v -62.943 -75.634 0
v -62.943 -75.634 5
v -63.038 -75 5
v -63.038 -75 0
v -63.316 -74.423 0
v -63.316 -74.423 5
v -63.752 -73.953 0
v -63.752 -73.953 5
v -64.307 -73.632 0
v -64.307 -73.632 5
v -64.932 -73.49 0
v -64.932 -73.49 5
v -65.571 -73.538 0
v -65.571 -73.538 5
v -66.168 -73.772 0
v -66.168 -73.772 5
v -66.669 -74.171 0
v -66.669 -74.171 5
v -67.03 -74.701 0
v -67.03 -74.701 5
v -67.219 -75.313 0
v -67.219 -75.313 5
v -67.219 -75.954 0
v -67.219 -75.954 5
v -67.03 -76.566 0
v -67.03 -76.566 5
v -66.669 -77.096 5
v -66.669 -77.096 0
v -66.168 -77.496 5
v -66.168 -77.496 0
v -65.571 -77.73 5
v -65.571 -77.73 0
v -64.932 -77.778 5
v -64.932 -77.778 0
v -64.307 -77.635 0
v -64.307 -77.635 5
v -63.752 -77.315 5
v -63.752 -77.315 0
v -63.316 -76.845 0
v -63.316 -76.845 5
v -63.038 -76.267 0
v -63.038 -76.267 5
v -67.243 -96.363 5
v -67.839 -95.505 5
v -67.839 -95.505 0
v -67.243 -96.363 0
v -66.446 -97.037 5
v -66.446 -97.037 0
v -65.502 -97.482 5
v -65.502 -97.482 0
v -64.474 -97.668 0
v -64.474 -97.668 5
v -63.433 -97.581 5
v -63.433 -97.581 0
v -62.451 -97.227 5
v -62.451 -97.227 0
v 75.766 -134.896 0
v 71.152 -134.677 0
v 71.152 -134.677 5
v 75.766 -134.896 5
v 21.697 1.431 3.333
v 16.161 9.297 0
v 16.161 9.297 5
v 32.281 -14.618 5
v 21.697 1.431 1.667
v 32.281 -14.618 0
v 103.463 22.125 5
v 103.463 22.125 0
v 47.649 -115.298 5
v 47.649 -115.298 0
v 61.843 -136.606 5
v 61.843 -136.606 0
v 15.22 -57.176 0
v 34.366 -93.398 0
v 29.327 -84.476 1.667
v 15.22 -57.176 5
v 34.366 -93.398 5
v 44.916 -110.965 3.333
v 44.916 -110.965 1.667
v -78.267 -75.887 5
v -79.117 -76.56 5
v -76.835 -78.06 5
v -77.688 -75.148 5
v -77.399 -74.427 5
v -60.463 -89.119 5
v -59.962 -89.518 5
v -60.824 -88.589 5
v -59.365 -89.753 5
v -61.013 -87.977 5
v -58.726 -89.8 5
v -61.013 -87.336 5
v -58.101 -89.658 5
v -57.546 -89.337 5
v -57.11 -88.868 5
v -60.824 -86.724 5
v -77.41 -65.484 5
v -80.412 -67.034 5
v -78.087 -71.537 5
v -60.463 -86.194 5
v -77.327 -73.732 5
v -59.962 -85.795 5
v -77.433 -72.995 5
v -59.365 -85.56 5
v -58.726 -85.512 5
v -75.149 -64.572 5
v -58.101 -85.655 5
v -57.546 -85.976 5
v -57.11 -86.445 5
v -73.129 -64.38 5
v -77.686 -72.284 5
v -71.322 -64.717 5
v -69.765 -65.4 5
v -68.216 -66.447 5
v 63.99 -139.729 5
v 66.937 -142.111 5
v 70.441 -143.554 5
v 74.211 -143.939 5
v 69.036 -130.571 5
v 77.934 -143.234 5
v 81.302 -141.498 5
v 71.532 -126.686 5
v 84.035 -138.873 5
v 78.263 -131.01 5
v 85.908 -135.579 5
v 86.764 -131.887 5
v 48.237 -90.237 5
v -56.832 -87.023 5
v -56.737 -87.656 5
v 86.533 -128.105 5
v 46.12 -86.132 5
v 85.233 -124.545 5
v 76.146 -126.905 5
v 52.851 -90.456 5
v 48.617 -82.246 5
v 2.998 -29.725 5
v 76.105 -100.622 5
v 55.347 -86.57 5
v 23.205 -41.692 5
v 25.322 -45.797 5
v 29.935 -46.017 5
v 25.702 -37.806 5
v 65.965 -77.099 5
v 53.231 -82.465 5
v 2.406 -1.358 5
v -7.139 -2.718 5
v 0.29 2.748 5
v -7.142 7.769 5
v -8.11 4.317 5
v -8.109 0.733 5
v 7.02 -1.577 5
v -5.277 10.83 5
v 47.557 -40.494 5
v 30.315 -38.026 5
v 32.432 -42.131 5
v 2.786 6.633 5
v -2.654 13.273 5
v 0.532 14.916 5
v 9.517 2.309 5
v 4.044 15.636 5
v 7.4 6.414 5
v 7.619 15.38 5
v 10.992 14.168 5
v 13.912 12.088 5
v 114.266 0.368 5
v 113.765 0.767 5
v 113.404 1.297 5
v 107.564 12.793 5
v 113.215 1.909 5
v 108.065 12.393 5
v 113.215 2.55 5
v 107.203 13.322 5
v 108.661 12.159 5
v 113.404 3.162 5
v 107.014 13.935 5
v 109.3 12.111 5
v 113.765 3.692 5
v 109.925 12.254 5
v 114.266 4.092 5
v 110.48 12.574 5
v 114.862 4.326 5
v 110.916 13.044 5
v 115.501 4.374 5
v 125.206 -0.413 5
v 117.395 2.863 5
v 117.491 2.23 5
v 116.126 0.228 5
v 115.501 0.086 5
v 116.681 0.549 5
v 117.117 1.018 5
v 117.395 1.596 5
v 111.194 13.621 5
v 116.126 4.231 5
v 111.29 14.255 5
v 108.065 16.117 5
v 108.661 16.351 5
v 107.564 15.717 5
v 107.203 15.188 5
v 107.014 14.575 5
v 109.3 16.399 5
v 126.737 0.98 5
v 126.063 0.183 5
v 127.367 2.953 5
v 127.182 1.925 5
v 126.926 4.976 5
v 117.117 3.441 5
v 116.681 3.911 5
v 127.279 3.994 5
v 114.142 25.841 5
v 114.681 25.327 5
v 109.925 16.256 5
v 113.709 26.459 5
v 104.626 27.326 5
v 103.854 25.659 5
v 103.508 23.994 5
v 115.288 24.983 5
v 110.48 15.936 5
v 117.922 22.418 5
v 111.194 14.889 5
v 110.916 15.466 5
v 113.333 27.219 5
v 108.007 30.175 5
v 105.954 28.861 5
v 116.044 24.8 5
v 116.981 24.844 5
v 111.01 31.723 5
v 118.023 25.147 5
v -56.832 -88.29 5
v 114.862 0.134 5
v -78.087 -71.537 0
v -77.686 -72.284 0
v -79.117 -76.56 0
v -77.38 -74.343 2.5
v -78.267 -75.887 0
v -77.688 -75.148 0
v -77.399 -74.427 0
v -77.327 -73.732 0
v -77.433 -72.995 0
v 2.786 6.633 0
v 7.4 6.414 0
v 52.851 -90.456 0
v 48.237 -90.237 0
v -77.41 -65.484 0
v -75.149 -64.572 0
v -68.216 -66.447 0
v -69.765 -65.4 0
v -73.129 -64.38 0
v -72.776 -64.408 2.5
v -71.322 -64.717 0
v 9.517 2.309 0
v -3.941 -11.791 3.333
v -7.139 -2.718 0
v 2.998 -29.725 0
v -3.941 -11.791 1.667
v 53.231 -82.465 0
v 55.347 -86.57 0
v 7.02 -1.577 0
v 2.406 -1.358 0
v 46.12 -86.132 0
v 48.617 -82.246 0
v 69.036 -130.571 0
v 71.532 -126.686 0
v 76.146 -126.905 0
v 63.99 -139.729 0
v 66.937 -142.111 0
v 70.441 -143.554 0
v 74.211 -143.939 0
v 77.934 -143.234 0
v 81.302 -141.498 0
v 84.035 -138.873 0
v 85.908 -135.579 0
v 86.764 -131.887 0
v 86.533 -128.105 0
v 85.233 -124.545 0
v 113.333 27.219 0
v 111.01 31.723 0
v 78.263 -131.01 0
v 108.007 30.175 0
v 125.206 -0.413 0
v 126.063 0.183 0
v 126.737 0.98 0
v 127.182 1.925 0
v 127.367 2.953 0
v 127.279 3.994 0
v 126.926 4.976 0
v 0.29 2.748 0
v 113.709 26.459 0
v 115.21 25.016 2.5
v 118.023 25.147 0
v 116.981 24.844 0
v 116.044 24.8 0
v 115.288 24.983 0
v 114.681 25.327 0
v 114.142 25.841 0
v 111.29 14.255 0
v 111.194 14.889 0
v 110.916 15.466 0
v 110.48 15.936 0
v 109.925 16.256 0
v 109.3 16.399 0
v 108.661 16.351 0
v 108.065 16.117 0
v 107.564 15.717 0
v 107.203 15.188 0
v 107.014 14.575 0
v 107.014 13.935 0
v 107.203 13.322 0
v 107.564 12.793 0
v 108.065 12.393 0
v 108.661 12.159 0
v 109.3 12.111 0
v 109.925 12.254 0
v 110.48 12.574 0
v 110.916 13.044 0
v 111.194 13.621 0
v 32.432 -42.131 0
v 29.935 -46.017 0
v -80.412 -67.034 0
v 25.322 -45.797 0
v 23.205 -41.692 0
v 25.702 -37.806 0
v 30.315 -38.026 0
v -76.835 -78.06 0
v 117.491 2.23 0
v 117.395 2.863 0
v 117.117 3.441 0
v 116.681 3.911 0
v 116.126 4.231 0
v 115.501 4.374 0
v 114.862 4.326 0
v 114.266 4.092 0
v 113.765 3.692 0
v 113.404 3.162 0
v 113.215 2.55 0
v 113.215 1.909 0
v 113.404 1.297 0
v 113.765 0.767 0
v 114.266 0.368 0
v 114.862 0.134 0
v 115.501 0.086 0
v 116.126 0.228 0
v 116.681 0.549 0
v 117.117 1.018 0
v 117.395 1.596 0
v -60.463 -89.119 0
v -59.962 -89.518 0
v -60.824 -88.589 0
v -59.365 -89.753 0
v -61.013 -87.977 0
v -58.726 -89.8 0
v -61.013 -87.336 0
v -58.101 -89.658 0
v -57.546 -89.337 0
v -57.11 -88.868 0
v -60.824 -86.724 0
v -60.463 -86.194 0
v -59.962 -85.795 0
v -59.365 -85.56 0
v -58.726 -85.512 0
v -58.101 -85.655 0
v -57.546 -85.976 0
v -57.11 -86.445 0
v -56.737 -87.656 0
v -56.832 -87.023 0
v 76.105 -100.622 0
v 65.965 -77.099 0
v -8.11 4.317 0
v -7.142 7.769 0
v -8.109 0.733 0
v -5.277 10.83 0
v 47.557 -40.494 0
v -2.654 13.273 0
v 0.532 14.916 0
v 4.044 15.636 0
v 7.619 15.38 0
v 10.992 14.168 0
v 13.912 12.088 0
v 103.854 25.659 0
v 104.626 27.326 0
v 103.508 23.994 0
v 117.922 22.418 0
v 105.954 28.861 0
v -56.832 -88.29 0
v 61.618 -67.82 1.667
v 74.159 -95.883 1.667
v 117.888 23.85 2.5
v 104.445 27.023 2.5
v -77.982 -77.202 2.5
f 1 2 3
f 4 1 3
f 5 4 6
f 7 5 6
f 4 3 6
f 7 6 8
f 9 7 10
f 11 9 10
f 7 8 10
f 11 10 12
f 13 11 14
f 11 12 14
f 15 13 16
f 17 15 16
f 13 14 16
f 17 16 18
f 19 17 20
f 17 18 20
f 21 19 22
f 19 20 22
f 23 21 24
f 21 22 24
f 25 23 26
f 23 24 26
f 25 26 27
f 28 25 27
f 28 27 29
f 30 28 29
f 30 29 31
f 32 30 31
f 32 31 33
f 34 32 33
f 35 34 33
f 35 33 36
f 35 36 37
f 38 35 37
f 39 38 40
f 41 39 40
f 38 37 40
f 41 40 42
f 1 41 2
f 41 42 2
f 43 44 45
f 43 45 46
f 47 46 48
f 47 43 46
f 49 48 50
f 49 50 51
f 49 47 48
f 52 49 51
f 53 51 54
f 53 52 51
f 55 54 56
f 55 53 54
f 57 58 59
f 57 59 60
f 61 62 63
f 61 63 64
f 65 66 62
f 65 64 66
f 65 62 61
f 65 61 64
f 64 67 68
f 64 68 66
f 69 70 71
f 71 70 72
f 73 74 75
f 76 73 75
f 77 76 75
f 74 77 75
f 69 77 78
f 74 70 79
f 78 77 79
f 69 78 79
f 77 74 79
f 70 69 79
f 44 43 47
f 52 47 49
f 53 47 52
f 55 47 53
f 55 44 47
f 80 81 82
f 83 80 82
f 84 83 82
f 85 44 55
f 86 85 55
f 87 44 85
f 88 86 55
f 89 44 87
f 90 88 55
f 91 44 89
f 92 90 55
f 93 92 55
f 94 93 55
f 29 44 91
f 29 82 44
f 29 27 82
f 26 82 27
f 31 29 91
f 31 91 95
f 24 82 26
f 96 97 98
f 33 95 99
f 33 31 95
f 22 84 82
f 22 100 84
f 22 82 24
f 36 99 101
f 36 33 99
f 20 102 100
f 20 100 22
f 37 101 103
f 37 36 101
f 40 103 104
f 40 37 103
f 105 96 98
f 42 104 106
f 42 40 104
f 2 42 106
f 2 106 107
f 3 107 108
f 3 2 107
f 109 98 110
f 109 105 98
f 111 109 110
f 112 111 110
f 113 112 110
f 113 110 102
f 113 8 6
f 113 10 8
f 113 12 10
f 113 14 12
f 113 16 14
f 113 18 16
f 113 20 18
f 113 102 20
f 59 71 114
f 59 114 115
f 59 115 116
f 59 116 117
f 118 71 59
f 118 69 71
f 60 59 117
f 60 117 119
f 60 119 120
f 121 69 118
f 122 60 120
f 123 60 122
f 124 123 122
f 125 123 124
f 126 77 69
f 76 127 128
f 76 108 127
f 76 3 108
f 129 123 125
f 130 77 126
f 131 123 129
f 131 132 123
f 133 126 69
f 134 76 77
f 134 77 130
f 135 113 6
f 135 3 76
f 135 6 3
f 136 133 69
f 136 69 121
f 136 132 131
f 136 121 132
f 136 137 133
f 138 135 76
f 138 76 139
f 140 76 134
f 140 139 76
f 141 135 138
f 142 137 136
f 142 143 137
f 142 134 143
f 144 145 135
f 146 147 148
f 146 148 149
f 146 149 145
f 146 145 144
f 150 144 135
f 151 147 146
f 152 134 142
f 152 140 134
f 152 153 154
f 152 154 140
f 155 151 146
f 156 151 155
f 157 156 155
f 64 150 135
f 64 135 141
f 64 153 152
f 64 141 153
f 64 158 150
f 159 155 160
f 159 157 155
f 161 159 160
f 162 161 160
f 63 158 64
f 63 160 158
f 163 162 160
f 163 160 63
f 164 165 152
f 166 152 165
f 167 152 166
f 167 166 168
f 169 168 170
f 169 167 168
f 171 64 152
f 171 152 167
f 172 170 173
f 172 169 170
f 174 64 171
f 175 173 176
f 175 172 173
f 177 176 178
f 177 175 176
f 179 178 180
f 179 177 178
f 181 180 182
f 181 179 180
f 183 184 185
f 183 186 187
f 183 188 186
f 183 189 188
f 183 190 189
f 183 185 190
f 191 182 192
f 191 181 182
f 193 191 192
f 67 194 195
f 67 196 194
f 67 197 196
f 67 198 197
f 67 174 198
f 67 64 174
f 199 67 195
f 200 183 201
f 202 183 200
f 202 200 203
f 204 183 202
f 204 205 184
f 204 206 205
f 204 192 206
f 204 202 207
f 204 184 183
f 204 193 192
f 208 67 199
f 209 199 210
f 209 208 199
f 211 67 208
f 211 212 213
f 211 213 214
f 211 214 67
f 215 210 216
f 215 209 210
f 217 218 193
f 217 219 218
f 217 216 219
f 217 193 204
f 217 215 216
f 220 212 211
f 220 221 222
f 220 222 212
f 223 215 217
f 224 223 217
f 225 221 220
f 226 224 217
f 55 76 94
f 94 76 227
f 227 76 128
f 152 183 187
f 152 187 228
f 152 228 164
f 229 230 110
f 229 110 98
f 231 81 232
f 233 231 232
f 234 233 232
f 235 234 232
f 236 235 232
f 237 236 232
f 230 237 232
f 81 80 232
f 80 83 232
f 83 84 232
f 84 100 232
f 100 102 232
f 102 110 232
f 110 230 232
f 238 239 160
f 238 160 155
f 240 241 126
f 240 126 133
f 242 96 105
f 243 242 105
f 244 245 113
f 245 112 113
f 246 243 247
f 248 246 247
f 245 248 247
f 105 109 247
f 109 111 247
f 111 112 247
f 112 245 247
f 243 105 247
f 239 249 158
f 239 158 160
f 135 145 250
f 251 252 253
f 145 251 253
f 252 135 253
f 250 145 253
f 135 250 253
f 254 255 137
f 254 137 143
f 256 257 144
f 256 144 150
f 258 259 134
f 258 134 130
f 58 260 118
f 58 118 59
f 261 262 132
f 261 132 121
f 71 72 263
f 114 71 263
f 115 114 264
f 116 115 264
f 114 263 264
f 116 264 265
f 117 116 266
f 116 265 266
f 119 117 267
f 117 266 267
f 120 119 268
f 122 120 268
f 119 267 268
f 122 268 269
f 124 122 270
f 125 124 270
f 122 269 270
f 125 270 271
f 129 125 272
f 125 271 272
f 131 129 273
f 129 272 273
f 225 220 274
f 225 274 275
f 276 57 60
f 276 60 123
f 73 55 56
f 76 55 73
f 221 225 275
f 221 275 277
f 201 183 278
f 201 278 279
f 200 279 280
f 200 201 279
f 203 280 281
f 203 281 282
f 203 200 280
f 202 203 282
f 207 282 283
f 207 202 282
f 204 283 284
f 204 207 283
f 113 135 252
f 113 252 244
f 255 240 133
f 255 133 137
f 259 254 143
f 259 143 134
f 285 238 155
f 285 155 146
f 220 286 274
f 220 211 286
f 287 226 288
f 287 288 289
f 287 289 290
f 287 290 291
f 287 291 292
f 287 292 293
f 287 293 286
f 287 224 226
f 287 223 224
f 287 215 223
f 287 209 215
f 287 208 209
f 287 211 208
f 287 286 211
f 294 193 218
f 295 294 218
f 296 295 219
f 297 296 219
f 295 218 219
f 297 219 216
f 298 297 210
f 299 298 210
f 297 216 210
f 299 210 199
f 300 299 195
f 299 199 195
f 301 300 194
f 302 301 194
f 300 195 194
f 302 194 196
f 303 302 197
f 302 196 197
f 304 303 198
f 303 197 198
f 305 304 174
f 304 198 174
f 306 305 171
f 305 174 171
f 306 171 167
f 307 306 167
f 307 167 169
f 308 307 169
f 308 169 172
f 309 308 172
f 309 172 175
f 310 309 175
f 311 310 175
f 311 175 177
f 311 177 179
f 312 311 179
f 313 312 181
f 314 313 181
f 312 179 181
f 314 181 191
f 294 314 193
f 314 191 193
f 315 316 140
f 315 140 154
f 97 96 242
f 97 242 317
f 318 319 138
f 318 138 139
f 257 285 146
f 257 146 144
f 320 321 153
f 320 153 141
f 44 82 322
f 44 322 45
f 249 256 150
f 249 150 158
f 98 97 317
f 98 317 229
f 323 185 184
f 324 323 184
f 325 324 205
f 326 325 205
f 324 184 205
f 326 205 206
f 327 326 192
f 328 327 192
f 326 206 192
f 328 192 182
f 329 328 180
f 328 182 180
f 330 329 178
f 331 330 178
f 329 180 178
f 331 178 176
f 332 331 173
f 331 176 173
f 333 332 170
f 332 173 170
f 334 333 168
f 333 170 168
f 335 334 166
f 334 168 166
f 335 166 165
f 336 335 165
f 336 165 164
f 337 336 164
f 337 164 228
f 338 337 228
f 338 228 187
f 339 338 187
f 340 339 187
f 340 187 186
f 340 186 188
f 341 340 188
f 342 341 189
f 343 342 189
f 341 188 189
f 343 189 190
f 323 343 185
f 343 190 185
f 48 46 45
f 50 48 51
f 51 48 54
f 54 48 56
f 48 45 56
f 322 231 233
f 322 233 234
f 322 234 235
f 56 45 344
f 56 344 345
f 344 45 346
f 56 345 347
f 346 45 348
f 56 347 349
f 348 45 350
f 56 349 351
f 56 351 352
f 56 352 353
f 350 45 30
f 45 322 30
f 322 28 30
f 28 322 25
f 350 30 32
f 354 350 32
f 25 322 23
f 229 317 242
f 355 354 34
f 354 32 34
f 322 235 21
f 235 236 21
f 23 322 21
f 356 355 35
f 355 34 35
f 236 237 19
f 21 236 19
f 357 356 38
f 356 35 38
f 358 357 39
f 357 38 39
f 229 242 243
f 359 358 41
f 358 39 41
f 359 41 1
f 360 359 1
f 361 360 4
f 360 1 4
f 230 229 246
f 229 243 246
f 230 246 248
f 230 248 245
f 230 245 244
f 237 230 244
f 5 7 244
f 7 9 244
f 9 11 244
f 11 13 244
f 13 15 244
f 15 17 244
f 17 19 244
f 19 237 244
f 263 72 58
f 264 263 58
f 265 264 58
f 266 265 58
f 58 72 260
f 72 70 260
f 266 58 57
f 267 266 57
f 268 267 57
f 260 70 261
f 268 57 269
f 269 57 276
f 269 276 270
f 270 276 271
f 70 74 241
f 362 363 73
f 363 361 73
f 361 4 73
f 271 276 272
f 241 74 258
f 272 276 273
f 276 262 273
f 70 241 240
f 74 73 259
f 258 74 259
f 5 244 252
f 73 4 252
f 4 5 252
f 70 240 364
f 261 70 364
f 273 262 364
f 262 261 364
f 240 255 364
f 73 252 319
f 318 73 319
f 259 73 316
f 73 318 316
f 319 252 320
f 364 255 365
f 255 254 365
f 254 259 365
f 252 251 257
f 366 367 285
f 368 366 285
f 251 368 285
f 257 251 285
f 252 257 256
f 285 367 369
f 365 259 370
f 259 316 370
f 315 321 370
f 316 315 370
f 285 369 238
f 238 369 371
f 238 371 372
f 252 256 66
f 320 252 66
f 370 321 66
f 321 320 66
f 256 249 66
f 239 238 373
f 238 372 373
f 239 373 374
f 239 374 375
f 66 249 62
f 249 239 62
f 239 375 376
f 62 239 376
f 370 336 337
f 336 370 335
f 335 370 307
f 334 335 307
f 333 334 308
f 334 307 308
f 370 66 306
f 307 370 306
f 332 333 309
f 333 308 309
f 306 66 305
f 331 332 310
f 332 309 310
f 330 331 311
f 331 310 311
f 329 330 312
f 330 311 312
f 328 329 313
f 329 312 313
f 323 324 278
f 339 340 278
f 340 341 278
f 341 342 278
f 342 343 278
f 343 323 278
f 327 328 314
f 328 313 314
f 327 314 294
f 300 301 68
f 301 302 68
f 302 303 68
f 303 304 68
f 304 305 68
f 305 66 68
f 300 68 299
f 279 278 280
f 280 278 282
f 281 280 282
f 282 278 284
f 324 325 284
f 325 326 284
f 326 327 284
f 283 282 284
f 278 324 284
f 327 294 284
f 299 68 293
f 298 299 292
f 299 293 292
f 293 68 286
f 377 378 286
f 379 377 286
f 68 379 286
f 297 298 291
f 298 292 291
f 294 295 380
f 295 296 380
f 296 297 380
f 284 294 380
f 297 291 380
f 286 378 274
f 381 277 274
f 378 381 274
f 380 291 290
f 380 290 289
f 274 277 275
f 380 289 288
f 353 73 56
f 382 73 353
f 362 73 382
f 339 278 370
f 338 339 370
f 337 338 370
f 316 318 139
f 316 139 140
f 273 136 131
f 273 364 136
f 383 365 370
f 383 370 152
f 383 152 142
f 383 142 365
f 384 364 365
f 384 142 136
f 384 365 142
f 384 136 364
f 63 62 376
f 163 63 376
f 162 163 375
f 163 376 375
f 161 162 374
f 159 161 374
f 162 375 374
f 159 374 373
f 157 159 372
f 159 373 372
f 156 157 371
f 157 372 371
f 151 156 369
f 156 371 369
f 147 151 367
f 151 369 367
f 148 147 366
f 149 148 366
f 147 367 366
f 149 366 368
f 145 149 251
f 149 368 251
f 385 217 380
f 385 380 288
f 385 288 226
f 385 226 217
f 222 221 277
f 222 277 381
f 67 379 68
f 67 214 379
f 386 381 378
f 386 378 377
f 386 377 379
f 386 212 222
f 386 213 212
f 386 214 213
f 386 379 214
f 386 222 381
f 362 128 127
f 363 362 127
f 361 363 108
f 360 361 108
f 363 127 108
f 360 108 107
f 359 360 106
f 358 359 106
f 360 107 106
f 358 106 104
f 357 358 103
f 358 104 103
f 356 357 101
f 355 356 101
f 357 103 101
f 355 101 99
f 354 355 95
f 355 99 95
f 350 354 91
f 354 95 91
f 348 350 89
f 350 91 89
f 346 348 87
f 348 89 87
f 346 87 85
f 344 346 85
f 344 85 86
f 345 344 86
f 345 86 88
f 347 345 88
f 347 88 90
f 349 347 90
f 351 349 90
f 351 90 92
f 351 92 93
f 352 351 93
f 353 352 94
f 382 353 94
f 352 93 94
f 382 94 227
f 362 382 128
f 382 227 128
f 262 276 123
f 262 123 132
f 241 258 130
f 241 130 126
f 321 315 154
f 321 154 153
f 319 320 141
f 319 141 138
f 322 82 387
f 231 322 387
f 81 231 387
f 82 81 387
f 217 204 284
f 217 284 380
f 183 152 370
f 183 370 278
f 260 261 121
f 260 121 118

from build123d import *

# Parameters (mm, degrees)
BOSS_EXTRUDE1_DEPTH = 5
SKETCH4_R           = 2.15
BOSS_EXTRUDE2_DEPTH = 5


with BuildPart() as part:
    # Sketch3 → Boss-Extrude1 (new body)
    with BuildSketch(Plane.XY):
        with BuildLine():
            ThreePointArc((16.161070517, 9.296643019), (-1.117119854, 14.203399989), (-7.139484482, -2.718279914))
            add(Edge.make_bspline(
                [(-7.139484482, -2.718279914), (9.132754629, -50.436524862), (33.087399733, -95.298268059), (61.843065412, -136.60626672)],
                knots=[0, 0, 0, 0, 1, 1, 1, 1], degree=3))
            ThreePointArc((61.843065412, -136.60626672), (79.680701211, -142.48791497), (85.233269402, -124.545116316))
            add(Edge.make_bspline(
                [(16.161070517, 9.296643019), (45.599741143, -31.632336181), (68.256168937, -77.163504674), (85.233269402, -124.545116316)],
                knots=[0, 0, 0, 0, 1, 1, 1, 1], degree=3))
        make_face()
        Polygon((78.262696046, -131.010190899), (76.145869285, -126.905026127), (71.532278927, -126.685669492), (69.035515328, -130.571477627), (71.152342089, -134.676642399), (75.765932447, -134.895999034), align=None, mode=Mode.SUBTRACT)
        Polygon((55.347374171, -86.570478665), (53.230547411, -82.465313894), (48.616957052, -82.245957258), (46.120193454, -86.131765394), (48.237020214, -90.236930165), (52.850610573, -90.456286801), align=None, mode=Mode.SUBTRACT)
        Polygon((32.432052297, -42.130766432), (30.315225536, -38.025601661), (25.701635178, -37.806245025), (23.204871579, -41.69205316), (25.32169834, -45.797217932), (29.935288698, -46.016574567), align=None, mode=Mode.SUBTRACT)
        Polygon((9.516730422, 2.308945802), (7.399903662, 6.414110573), (2.786313303, 6.633467209), (0.289549705, 2.747659073), (2.406376465, -1.357505698), (7.019966824, -1.576862334), align=None, mode=Mode.SUBTRACT)
    extrude(amount=BOSS_EXTRUDE1_DEPTH)

    # Sketch4 → Boss-Extrude2 (add)
    # profile 1 of 2: a face of its own
    with BuildSketch(Plane.XY.offset(5)):
        with BuildLine():
            Line((-62.450693281, -97.22736689), (15.220358234, -57.176316709))
            add(Edge.make_bspline(
                [(2.997808313, -29.725276343), (6.797307694, -38.99575652), (10.8790517, -48.14793286), (15.220358234, -57.176316709)],
                knots=[0.19087071, 0.19087071, 0.19087071, 0.19087071, 0.389797815, 0.389797815, 0.389797815, 0.389797815], degree=3))
            Line((2.997808313, -29.725276343), (-68.216036929, -66.446670398))
            add(Edge.make_bspline(
                [(-77.409704675, -65.483914752), (-72.739634543, -62.850222111), (-68.216036929, -66.446670398)],
                knots=[0, 0, 0, 1, 1, 1], degree=2))
            Line((-77.409704675, -65.483914752), (-80.411912193, -67.033578992))
            Line((-80.411912193, -67.033578992), (-78.087434927, -71.536853276))
            add(Edge.make_bspline(
                [(-79.1174503, -76.560041992), (-76.157677443, -74.63824268), (-78.087434927, -71.536853276)],
                knots=[0.011104225, 0.011104225, 0.011104225, 1, 1, 1], degree=2))
            add(Edge.make_bspline(
                [(-76.835042304, -78.059565803), (-77.986988957, -77.094288184), (-79.1174503, -76.560041992)],
                knots=[0, 0, 0, 1, 1, 1], degree=2))
            Line((-76.835042304, -78.059565803), (-67.839096009, -95.50541566))
            ThreePointArc((-67.839096009, -95.50541566), (-65.501522422, -97.48236602), (-62.450693281, -97.22736689))
        make_face()
        with Locations((-58.886757215, -87.65648791)):
            Circle(SKETCH4_R, mode=Mode.SUBTRACT)
        with Locations((-65.092650278, -75.633639142)):
            Circle(SKETCH4_R, mode=Mode.SUBTRACT)
    # profile 2 of 2: a face of its own
    with BuildSketch(Plane.XY.offset(5)):
        with BuildLine():
            add(Edge.make_bspline(
                [(32.280750269, -14.617843465), (37.629854463, -23.089001057), (42.718912178, -31.721489708), (47.556604904, -40.493649318)],
                knots=[0.190825277, 0.190825277, 0.190825277, 0.190825277, 0.38974783, 0.38974783, 0.38974783, 0.38974783], degree=3))
            Line((47.556604904, -40.493649318), (125.205794469, -0.413084682))
            ThreePointArc((125.205794469, -0.413084682), (127.181774896, 1.925308859), (126.925510125, 4.976031949))
            Line((126.925510125, 4.976031949), (117.922327039, 22.418148257))
            add(Edge.make_bspline(
                [(117.922327039, 22.418148257), (117.803338747, 23.916341756), (118.02315462, 25.147212514)],
                knots=[0, 0, 0, 1, 1, 1], degree=2))
            add(Edge.make_bspline(
                [(118.02315462, 25.147212514), (114.741637832, 23.849053997), (113.332685388, 27.219133104)],
                knots=[0.011104225, 0.011104225, 0.011104225, 1, 1, 1], degree=2))
            Line((113.332685388, 27.219133104), (111.010076543, 31.723371329))
            Line((111.010076543, 31.723371329), (108.007226392, 30.174952712))
            add(Edge.make_bspline(
                [(108.007226392, 30.174952712), (103.154331871, 27.895631161), (103.463399948, 22.124855428)],
                knots=[0, 0, 0, 1, 1, 1], degree=2))
            Line((103.463399948, 22.124855428), (32.280750269, -14.617843465))
        make_face()
        with Locations((115.340727562, 2.229607059)):
            Circle(SKETCH4_R, mode=Mode.SUBTRACT)
        with Locations((109.139822812, 14.255029359)):
            Circle(SKETCH4_R, mode=Mode.SUBTRACT)
    extrude(amount=-BOSS_EXTRUDE2_DEPTH)


solid = part.part
